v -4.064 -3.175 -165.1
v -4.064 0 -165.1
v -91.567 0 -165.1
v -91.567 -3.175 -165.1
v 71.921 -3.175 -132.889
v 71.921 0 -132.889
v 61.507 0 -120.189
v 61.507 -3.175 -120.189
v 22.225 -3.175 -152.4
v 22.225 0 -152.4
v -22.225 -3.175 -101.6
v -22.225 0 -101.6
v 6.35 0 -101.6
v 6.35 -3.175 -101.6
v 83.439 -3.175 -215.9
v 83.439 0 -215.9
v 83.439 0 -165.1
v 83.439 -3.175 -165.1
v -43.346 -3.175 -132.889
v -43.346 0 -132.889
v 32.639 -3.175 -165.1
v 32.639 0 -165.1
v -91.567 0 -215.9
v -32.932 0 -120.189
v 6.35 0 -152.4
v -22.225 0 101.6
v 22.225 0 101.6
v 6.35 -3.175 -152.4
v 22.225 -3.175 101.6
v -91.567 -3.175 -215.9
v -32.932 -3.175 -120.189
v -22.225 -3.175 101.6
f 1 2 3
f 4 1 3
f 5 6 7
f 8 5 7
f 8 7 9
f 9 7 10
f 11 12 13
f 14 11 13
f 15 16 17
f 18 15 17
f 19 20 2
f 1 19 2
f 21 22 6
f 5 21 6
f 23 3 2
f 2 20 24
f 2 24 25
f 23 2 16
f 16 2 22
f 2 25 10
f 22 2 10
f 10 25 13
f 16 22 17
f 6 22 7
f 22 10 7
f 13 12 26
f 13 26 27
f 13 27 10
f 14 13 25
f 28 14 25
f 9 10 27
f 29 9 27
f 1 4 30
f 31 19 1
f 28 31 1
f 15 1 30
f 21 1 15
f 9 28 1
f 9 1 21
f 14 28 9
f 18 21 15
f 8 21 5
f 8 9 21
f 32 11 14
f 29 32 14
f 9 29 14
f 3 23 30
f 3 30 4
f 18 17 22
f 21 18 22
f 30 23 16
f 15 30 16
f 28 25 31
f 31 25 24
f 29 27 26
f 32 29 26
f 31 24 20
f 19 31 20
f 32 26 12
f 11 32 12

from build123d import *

# Parameters (mm, degrees)
F0_W     = 36.703
F0_H     = 50.8
F1_DEPTH = 3.175


with BuildPart() as f1:
    # F0 (on Front) → F1 (new body)
    with BuildSketch(Plane.XZ):
        Polygon((22.225, -101.6), (22.225, 101.6), (-22.225, 101.6), (-22.225, -101.6), (-6.35, -101.6), (6.35, -101.6), (6.35, -152.4), (-32.932004, -120.188757), (-43.346004, -132.888757), (-4.064, -165.1), (-54.864, -165.1), (-54.864, -215.9), (-4.064, -215.9), (14.2875, -215.9), (32.639, -215.9), (83.439, -215.9), (83.439, -165.1), (32.639, -165.1), (71.921004, -132.888757), (61.507004, -120.188757), (22.225, -152.4), align=None)
        with Locations((-73.2155, -190.5)):
            Rectangle(F0_W, F0_H)
    extrude(amount=F1_DEPTH)


solid = f1.part
